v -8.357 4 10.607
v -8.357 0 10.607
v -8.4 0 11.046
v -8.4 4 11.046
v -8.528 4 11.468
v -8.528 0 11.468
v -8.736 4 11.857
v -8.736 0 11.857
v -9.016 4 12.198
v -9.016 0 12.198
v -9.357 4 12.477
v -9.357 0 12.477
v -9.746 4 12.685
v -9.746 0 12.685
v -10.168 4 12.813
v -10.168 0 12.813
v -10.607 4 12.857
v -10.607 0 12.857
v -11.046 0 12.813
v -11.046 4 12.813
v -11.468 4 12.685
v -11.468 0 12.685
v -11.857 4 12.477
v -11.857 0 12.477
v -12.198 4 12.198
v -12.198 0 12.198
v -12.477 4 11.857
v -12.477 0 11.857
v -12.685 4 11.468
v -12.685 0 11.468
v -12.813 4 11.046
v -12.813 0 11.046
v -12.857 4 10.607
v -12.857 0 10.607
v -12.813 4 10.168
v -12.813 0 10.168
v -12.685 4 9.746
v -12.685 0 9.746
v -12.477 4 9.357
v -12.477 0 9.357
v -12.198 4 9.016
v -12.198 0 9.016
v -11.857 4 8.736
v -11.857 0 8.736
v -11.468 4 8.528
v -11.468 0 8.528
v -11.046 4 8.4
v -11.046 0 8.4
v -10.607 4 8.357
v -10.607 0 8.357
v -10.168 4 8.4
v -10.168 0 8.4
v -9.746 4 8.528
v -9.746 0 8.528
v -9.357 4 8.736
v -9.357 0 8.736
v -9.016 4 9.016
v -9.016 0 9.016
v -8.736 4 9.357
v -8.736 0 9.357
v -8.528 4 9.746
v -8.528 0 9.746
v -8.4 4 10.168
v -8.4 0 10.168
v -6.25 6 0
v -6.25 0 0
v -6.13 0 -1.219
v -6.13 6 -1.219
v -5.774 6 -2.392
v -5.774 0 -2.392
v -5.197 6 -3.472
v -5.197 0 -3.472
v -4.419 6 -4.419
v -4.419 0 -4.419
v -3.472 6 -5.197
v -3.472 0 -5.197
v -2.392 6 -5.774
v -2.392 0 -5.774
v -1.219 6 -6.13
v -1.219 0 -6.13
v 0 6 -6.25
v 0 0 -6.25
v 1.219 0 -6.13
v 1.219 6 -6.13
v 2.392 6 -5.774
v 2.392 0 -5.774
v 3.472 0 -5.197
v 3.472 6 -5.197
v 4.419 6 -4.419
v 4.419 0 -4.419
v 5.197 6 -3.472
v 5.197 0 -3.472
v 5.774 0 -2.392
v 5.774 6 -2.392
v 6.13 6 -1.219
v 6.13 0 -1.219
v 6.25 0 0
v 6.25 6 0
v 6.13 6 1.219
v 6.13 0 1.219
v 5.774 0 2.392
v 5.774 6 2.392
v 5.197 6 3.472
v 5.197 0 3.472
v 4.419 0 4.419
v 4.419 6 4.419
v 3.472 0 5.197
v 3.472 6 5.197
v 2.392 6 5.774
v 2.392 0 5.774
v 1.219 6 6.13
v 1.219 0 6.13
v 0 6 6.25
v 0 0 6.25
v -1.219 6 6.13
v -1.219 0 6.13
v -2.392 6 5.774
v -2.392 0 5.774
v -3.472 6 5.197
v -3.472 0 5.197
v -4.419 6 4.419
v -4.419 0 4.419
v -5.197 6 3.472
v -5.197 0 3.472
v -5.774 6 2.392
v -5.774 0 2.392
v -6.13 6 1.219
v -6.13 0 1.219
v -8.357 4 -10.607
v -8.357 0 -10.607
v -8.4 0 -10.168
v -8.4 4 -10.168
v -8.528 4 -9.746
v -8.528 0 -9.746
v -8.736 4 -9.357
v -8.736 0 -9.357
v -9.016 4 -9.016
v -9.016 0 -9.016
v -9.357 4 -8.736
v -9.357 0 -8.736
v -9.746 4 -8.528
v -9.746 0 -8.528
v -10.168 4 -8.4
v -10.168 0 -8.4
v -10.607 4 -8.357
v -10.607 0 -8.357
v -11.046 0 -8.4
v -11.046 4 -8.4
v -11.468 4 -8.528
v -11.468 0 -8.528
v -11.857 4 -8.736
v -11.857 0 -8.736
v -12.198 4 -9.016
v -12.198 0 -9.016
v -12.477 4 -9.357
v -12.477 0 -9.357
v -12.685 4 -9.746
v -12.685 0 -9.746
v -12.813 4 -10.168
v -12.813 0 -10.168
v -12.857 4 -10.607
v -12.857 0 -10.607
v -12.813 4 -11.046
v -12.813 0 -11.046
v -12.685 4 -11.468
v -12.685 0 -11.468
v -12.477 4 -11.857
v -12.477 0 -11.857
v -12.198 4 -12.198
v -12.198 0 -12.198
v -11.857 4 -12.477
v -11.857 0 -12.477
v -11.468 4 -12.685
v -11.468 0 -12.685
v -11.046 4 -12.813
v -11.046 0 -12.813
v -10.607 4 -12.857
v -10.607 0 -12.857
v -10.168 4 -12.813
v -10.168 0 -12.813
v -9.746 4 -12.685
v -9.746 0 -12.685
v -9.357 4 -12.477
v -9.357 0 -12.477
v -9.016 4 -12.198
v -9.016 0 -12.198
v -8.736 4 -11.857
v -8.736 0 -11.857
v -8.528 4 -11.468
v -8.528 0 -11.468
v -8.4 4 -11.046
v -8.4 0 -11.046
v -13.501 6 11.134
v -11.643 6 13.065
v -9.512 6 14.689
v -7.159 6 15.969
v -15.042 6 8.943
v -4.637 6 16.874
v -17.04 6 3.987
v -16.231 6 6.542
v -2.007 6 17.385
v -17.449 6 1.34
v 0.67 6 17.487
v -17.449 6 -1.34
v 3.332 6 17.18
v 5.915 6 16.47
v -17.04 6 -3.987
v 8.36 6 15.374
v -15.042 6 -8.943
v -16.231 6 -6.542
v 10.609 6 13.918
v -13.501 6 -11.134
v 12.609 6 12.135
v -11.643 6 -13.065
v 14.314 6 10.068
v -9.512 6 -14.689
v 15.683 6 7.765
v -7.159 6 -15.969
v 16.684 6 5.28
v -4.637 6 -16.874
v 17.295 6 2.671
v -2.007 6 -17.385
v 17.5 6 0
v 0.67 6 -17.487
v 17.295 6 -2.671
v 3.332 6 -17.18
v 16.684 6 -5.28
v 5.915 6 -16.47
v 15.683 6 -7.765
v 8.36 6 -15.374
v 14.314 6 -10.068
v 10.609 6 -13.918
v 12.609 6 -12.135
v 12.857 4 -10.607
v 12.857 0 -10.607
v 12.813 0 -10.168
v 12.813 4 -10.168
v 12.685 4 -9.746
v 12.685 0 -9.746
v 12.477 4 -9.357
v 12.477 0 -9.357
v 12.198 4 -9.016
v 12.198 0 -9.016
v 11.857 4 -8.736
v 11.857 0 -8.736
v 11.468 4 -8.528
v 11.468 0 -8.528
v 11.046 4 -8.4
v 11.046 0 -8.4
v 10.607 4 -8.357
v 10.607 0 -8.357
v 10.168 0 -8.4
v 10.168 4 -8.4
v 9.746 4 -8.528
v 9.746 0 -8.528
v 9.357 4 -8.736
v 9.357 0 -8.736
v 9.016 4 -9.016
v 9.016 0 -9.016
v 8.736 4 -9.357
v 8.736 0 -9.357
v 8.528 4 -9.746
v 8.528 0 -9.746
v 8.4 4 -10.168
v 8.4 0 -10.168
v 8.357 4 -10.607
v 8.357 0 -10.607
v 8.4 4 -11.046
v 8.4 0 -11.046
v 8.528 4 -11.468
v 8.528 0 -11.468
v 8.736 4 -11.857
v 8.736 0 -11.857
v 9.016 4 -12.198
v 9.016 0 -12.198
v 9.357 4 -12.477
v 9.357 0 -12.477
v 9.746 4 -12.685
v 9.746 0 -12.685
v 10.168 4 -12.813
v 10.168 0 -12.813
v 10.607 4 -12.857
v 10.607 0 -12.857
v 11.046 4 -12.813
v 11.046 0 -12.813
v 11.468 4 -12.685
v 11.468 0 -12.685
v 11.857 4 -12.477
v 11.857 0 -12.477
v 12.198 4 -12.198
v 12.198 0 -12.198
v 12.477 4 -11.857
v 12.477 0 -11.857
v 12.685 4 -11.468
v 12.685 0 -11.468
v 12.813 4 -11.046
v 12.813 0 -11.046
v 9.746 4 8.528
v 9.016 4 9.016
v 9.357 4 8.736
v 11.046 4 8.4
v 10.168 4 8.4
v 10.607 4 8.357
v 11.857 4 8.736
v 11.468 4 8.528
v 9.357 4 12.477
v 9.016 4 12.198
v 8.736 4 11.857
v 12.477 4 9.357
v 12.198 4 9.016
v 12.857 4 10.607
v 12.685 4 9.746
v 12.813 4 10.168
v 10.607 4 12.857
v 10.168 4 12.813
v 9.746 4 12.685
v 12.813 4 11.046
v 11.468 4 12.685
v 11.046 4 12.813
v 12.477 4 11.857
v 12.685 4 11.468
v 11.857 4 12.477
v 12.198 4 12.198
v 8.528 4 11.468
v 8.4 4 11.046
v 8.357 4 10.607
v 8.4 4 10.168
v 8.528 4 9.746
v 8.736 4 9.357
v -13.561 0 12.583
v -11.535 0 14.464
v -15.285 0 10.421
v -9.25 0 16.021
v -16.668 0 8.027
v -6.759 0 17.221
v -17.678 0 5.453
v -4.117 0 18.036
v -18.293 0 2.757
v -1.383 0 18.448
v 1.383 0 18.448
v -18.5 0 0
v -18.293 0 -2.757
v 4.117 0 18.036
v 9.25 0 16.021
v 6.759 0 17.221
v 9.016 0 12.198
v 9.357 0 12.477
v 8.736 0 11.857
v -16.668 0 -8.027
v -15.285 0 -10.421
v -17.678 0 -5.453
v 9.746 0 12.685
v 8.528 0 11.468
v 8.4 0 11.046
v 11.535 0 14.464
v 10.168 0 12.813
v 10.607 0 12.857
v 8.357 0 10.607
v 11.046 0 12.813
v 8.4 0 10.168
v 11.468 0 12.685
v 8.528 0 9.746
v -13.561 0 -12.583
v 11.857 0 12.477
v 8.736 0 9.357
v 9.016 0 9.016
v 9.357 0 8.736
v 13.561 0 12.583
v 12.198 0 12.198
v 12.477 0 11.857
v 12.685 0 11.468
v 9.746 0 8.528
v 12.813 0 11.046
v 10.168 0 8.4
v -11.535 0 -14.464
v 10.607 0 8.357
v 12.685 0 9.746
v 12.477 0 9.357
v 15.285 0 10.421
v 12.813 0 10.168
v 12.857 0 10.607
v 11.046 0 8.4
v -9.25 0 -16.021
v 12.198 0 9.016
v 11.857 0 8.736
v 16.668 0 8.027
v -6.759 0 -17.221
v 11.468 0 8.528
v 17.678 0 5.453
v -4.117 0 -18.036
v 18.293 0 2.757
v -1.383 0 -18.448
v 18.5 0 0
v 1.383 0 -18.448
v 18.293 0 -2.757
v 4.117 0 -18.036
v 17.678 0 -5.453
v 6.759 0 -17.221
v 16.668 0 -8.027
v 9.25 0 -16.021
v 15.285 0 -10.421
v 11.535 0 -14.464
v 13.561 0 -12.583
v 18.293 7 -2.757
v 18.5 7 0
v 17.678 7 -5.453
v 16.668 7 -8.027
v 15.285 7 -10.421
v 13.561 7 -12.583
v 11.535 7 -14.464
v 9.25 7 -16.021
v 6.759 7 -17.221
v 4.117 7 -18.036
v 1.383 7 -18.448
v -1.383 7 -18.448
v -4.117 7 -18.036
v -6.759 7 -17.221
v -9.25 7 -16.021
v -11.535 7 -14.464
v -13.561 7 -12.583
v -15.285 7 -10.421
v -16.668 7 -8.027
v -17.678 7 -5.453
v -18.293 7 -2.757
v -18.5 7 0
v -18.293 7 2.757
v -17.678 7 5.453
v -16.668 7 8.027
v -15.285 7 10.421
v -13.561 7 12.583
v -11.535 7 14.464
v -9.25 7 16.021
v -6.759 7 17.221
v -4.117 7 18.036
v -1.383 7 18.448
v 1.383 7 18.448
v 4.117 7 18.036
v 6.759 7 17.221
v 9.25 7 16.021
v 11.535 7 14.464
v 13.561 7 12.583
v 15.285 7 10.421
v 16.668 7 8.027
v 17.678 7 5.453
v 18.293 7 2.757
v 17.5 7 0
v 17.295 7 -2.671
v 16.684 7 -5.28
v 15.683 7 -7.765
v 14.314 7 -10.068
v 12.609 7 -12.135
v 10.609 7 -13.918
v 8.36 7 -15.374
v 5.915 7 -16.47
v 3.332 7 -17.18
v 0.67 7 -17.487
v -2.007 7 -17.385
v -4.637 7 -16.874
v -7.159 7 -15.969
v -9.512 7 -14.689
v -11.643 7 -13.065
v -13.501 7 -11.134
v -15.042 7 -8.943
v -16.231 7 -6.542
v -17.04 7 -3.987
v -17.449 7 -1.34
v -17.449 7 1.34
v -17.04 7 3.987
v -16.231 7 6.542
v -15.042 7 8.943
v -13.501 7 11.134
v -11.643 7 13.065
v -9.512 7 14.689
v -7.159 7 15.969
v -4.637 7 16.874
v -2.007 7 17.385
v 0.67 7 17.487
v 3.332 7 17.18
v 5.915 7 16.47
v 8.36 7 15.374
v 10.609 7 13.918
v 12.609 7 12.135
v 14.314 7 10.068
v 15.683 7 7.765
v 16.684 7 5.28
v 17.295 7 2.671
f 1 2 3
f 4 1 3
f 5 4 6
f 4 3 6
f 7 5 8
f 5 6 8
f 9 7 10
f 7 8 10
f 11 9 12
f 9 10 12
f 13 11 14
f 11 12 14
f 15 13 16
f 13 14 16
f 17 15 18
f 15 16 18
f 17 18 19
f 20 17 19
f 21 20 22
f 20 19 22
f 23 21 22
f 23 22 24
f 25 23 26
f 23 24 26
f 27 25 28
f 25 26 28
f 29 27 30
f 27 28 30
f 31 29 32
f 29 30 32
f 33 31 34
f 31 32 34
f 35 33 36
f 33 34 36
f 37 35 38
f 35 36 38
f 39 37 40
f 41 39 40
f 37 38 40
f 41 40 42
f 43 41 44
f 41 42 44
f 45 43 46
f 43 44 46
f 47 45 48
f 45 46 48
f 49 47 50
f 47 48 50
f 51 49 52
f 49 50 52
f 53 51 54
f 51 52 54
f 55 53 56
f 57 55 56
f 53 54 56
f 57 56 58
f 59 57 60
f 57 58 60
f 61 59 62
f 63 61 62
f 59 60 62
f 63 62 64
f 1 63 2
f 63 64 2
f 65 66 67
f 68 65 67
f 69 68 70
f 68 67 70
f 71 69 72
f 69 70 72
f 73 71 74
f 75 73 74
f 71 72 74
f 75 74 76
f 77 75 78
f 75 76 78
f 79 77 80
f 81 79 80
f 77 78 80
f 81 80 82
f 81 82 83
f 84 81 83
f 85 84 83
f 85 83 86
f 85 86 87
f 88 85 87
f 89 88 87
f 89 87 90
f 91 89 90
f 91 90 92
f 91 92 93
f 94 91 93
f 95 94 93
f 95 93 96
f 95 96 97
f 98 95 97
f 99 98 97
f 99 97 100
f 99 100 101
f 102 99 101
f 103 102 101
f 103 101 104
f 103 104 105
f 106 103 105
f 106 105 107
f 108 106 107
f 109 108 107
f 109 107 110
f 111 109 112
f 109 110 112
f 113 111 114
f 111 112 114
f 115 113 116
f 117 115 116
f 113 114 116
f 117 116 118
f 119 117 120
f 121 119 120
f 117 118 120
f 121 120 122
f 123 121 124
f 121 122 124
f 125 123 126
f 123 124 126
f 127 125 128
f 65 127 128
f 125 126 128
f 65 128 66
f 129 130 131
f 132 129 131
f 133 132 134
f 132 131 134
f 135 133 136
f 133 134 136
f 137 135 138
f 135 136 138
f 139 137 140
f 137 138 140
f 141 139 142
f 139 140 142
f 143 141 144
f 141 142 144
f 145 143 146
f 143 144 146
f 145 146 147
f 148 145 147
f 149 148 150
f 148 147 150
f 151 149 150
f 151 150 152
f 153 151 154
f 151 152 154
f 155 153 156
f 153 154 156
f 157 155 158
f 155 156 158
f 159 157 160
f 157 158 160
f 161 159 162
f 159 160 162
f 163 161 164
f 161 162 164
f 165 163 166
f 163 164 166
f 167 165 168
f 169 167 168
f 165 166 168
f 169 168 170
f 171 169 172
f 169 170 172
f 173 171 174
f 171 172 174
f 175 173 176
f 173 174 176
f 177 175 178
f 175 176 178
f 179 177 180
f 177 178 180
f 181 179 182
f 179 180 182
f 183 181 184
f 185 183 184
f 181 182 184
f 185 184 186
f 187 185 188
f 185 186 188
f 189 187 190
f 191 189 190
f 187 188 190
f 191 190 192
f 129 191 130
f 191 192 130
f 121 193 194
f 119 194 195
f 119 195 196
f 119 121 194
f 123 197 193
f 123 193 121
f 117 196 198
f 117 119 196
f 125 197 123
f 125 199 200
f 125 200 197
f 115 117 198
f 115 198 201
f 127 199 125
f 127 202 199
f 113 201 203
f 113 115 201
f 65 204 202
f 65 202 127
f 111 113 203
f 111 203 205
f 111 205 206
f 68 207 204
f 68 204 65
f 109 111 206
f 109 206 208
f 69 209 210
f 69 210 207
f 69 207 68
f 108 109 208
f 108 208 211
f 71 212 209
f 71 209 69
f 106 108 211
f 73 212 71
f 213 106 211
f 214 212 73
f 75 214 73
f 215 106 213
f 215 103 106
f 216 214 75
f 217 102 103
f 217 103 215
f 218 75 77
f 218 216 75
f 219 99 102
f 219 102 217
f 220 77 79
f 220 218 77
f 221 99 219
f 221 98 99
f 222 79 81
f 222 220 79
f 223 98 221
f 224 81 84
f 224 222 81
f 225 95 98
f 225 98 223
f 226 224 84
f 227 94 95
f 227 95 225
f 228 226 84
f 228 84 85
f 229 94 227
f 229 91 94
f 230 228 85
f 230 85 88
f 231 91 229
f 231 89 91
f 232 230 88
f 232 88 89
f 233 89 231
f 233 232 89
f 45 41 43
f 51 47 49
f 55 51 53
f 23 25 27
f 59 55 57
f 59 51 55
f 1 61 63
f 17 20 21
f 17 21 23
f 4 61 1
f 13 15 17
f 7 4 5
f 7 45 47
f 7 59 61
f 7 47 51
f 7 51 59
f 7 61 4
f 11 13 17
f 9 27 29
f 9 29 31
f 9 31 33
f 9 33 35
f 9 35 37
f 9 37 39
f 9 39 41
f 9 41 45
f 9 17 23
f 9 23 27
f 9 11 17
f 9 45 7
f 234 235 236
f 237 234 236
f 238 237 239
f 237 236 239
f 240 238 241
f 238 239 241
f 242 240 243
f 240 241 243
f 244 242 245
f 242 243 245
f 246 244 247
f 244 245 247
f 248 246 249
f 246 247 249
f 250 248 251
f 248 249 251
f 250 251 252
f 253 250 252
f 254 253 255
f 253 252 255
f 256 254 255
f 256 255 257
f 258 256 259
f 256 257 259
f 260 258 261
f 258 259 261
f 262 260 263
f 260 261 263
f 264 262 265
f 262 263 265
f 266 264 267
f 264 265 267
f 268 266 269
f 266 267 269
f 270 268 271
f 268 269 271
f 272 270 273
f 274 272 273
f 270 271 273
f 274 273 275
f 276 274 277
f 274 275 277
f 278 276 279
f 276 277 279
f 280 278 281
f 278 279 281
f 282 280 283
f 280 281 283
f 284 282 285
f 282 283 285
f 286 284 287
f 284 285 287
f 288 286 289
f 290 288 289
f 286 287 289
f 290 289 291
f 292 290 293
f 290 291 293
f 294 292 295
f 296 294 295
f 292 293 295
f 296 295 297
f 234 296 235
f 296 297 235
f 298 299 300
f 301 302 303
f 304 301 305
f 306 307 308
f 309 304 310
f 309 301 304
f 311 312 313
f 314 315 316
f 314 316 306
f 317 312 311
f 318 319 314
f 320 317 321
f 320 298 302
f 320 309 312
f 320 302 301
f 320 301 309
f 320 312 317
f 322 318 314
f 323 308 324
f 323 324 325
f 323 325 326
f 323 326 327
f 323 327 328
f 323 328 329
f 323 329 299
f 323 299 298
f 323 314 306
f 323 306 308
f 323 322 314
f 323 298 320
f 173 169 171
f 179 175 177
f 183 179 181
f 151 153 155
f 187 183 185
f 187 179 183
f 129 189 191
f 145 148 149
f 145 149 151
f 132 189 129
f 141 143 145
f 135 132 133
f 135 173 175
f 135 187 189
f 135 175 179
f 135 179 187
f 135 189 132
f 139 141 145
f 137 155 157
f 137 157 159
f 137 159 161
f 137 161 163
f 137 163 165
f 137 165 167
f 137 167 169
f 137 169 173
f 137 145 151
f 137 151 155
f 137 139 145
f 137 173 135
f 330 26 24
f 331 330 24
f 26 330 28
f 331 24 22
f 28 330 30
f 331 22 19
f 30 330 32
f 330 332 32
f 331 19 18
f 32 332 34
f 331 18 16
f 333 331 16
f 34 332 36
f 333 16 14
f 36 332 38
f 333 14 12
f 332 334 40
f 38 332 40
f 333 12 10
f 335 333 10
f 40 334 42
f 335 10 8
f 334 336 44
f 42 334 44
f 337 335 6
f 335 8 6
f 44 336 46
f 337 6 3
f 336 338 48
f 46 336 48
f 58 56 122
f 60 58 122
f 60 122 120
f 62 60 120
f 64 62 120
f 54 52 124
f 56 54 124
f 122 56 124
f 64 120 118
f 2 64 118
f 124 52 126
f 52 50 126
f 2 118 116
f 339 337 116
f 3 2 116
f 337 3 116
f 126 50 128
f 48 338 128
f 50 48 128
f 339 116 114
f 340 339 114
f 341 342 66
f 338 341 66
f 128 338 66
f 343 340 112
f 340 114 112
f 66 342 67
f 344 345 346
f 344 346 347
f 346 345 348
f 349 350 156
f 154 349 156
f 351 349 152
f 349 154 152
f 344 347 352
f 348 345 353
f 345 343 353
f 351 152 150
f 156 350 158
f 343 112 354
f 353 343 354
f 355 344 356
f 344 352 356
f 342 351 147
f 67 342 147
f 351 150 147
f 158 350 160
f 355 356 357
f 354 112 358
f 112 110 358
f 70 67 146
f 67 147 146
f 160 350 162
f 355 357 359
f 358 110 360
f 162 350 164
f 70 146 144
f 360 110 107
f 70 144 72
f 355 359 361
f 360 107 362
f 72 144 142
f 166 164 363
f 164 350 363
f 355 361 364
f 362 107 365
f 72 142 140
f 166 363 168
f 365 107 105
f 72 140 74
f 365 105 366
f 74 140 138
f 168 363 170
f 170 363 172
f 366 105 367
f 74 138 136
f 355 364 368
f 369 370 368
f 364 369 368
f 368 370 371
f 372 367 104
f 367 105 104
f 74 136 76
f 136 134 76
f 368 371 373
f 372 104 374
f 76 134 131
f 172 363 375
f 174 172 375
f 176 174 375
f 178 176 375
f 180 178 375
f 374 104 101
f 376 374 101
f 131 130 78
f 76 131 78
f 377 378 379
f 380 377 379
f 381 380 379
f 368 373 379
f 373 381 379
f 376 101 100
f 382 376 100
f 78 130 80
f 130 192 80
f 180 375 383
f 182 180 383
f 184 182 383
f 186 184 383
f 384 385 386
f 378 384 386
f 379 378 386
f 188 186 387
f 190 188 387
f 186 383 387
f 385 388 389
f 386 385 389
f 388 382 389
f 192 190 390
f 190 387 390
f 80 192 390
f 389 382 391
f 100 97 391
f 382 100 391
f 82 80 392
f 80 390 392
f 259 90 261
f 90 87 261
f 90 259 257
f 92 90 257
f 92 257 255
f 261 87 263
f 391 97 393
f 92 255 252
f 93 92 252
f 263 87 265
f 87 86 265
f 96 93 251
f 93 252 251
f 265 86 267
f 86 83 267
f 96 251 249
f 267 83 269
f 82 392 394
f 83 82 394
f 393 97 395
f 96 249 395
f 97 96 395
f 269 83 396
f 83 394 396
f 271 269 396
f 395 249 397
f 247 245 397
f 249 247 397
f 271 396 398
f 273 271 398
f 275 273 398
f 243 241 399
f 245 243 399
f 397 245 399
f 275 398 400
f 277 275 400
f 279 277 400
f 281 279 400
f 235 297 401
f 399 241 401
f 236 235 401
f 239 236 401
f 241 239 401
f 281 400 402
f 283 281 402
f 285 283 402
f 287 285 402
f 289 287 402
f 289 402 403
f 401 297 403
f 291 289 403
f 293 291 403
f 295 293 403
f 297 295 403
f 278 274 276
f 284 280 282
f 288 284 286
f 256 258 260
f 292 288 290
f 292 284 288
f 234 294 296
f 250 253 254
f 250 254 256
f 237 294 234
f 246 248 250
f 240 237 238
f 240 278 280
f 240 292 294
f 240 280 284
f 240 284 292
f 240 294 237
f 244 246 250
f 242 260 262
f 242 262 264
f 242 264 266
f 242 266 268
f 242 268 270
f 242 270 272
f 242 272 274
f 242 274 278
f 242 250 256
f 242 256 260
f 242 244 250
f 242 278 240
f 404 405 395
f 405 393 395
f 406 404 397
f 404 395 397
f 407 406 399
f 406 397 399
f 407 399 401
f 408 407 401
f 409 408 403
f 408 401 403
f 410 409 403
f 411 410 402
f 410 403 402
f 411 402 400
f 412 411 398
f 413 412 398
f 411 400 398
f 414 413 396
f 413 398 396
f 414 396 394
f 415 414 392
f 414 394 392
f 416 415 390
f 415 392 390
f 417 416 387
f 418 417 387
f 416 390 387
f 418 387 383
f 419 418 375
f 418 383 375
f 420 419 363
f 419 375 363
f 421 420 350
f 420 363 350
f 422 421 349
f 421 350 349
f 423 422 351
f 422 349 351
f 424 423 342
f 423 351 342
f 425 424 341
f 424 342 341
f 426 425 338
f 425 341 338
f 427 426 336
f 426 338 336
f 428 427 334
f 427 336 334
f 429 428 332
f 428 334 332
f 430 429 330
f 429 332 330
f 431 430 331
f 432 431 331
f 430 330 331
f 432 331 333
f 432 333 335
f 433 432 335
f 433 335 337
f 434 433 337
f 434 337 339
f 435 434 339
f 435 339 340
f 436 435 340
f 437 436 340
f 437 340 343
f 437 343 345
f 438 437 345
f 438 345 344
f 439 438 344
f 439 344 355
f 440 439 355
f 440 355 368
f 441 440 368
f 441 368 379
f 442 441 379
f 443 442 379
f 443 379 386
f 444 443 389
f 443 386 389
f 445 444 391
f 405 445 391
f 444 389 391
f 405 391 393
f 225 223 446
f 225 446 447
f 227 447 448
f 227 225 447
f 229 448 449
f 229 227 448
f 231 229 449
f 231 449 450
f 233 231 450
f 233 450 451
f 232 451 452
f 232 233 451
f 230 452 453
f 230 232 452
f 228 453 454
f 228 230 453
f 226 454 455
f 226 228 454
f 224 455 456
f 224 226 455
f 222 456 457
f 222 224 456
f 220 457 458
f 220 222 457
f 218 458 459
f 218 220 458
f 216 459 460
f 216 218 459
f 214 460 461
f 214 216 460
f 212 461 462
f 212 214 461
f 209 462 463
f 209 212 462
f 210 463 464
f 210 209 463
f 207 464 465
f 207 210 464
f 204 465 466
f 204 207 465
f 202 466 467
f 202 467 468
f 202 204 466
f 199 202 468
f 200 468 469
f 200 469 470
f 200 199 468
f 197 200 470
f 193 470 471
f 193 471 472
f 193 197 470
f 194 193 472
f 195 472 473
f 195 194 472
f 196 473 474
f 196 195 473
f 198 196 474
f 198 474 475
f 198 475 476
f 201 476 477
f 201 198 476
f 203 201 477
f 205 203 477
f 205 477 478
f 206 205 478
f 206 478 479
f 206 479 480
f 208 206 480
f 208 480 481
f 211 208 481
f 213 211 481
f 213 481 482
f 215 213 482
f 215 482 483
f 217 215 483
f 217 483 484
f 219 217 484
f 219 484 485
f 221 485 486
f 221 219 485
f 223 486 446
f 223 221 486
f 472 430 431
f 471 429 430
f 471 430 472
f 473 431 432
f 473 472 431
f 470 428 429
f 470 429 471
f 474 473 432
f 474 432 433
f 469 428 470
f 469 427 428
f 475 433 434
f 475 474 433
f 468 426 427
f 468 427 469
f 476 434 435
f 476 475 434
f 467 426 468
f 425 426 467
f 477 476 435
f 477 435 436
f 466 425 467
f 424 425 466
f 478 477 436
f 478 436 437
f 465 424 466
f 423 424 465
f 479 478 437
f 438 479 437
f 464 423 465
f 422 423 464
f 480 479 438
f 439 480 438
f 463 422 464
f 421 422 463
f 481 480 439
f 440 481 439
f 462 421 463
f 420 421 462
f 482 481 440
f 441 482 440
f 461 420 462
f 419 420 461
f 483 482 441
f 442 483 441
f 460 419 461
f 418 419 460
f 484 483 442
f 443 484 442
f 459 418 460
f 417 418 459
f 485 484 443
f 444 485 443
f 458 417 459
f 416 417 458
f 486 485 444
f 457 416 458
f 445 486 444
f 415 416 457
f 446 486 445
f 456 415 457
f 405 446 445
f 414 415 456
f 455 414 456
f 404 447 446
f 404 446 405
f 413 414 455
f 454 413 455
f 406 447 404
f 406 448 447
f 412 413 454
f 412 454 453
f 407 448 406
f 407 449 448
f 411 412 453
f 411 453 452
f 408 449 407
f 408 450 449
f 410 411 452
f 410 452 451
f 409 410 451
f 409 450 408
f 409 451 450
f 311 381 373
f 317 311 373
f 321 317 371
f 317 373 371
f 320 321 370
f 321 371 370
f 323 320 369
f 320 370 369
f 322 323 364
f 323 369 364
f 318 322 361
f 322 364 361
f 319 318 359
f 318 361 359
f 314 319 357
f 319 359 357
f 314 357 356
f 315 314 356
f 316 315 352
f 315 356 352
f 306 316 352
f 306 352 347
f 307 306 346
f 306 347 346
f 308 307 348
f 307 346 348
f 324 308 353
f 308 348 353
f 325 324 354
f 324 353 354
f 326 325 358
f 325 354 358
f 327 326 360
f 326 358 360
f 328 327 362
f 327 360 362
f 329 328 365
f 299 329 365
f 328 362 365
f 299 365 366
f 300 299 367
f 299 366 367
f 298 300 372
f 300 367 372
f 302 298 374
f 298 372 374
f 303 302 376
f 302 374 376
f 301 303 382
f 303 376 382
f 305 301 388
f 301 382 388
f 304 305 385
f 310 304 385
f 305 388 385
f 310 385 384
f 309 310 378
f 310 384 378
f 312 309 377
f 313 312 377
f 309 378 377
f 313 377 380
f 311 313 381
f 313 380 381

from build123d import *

# Parameters (mm, degrees)
SKETCH1_R              = 18.5
BOSS_EXTRUDE1_DEPTH    = 6
SKETCH2_R              = 18.5
SKETCH2_R_2            = 17.5
BOSS_EXTRUDE2_DEPTH    = 1
M14X1_5_TAPPED_HOLE1_D = 12.5
SKETCH5_R              = 2.25
CUT_EXTRUDE1_DEPTH     = 4


with BuildPart() as part:
    # Sketch1 → Boss-Extrude1 (new body)
    with BuildSketch(Plane(origin=(0, 0, 0), x_dir=(1, 0, 0), z_dir=(0, 1, 0))):
        Circle(SKETCH1_R)
    extrude(amount=BOSS_EXTRUDE1_DEPTH)

    # Sketch2 → Boss-Extrude2 (add)
    with BuildSketch(Plane(origin=(0, 6, 0), x_dir=(1, 0, 0), z_dir=(0, 1, 0))):
        Circle(SKETCH2_R)
        Circle(SKETCH2_R_2, mode=Mode.SUBTRACT)
    extrude(amount=BOSS_EXTRUDE2_DEPTH)

    # M14x1.5 Tapped Hole1 (through all)
    with Locations(Plane(origin=(0, 6, 0), x_dir=(1, 0, 0), z_dir=(0, 1, 0))):
        with Locations((0, 0)):
            Hole(M14X1_5_TAPPED_HOLE1_D / 2)

    # Sketch5 → Cut-Extrude1 (cut)
    with BuildSketch(Plane.XZ):
        with Locations((-10.606601718, 10.606601718)):
            Circle(SKETCH5_R)
        with Locations((10.606601718, 10.606601718)):
            Circle(SKETCH5_R)
        with Locations((10.606601718, -10.606601718)):
            Circle(SKETCH5_R)
        with Locations((-10.606601718, -10.606601718)):
            Circle(SKETCH5_R)
    extrude(amount=-CUT_EXTRUDE1_DEPTH, mode=Mode.SUBTRACT)


solid = part.part
